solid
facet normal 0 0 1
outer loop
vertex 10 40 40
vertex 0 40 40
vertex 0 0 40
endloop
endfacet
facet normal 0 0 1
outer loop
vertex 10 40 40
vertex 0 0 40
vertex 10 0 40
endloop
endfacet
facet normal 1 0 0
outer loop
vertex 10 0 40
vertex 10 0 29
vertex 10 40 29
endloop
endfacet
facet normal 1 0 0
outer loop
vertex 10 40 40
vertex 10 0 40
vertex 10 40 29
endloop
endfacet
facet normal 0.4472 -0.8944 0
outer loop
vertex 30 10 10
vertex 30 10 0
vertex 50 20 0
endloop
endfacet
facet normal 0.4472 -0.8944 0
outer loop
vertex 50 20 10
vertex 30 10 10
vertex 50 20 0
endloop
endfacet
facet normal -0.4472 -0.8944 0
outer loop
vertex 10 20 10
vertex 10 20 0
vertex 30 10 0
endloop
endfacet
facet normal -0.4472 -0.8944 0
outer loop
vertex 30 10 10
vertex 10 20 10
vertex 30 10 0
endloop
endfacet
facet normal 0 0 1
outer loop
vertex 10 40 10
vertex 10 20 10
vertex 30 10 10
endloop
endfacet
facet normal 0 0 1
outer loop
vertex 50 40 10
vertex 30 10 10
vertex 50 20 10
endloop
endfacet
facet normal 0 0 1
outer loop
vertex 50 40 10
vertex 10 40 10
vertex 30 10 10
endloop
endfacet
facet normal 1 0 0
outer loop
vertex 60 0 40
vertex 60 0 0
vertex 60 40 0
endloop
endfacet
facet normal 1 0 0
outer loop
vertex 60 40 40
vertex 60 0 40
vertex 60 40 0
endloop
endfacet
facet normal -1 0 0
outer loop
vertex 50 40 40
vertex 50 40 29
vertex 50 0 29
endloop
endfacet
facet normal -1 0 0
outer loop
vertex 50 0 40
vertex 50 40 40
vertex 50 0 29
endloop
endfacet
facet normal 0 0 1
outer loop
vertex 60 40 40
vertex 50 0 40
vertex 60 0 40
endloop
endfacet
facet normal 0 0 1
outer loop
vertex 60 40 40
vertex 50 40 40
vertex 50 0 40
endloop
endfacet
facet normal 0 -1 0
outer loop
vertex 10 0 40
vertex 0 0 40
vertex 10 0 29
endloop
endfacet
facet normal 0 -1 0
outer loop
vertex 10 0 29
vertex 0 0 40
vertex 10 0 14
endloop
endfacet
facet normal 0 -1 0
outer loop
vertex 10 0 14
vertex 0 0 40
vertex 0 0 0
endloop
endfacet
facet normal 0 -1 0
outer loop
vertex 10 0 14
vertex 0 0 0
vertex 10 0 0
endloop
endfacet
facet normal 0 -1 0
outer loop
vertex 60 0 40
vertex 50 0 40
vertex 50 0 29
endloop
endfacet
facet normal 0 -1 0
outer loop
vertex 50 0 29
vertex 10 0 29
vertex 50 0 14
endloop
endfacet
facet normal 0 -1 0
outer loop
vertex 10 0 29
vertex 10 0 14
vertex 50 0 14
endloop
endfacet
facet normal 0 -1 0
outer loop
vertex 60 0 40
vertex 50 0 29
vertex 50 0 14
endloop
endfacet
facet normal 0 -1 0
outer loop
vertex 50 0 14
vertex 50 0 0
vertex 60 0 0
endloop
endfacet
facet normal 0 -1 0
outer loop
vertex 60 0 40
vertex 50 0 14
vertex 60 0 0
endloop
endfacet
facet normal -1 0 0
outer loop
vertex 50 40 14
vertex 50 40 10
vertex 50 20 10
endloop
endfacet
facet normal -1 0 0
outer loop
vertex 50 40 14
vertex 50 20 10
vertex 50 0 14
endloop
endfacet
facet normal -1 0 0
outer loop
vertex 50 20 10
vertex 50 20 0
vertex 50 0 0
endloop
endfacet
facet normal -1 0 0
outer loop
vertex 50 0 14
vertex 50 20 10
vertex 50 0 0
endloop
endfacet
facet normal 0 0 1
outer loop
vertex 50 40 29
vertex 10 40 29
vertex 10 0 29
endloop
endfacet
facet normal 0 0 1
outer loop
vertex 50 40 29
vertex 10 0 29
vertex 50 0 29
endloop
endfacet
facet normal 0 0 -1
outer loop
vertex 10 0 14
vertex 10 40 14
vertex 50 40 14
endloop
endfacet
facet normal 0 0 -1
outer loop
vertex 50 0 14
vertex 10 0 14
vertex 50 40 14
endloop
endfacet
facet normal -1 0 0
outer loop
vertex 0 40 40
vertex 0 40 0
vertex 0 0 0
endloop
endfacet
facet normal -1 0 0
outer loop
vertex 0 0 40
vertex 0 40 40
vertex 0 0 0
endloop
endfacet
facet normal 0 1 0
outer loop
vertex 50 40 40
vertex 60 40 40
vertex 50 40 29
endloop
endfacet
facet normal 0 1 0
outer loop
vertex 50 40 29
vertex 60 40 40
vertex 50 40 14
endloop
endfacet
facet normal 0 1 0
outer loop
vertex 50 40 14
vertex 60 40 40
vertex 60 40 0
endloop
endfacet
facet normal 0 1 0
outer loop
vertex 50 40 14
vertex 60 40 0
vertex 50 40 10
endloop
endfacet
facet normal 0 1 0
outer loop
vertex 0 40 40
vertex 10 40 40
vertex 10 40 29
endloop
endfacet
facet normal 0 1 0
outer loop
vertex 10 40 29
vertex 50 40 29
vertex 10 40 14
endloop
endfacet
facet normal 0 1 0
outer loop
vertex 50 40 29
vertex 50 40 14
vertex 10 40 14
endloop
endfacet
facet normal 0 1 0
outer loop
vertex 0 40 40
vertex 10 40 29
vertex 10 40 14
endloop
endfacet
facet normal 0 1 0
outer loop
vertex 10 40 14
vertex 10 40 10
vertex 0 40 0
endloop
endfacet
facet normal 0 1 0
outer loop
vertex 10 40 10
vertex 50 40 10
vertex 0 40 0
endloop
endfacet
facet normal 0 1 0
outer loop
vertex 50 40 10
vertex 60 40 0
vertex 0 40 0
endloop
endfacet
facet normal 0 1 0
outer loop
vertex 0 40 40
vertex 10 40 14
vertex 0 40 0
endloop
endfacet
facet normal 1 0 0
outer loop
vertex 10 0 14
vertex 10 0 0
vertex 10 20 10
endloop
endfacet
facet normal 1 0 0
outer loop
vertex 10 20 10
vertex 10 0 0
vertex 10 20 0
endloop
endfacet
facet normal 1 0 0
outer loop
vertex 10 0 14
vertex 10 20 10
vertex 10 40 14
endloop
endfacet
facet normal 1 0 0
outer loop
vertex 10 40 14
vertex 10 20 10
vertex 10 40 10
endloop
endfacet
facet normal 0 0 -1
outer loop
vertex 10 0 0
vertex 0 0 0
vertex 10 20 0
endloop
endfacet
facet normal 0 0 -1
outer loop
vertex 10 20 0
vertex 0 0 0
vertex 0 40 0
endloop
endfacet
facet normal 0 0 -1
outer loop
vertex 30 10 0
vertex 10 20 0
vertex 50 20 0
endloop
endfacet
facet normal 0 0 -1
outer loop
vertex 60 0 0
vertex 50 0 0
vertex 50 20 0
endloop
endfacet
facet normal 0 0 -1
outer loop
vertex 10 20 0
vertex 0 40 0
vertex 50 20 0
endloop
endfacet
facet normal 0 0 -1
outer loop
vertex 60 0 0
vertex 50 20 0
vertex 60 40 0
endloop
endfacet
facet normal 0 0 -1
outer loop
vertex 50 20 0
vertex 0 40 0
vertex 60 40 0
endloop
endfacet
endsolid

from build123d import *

# Parameters (mm, degrees)
F0_W     = 20
F0_H     = 10
F1_DEPTH = 10
F2_DEPTH = 40
F3_START = 14
F3_DEPTH = 15


with BuildPart() as f1:
    # F0 (on Top) → F1 (new body)
    with BuildSketch(Plane.XY):
        with Locations((20, 35)):
            Rectangle(F0_W, F0_H)
        with Locations((40, 35)):
            Rectangle(F0_W, F0_H)
        with Locations((40, 25)):
            Rectangle(F0_W, F0_H)
        with Locations((20, 25)):
            Rectangle(F0_W, F0_H)
        Polygon((10, 20), (30, 10), (30, 20), align=None)
        Polygon((30, 20), (30, 10), (50, 20), align=None)
    extrude(amount=F1_DEPTH)

    # F0 (on Top) → F2 (join)
    with BuildSketch(Plane.XY):
        Polygon((0, 40), (0, 0), (10, 0), (10, 10), (10, 20), (10, 30), (10, 40), align=None)
        Polygon((50, 10), (50, 0), (60, 0), (60, 40), (50, 40), (50, 30), (50, 20), align=None)
    extrude(amount=F2_DEPTH)

    # F0 (on Top) → F3 (join)
    with BuildSketch(Plane.XY.offset(F3_START)):
        with Locations((40, 35)):
            Rectangle(F0_W, F0_H)
        with Locations((20, 35)):
            Rectangle(F0_W, F0_H)
        with Locations((20, 25)):
            Rectangle(F0_W, F0_H)
        with Locations((40, 25)):
            Rectangle(F0_W, F0_H)
        Polygon((10, 20), (30, 10), (30, 20), align=None)
        Polygon((30, 20), (30, 10), (50, 20), align=None)
        with Locations((40, 5)):
            Rectangle(F0_W, F0_H)
        with Locations((20, 5)):
            Rectangle(F0_W, F0_H)
        Polygon((10, 20), (10, 10), (30, 10), align=None)
        Polygon((50, 20), (30, 10), (50, 10), align=None)
    extrude(amount=F3_DEPTH)


solid = f1.part
